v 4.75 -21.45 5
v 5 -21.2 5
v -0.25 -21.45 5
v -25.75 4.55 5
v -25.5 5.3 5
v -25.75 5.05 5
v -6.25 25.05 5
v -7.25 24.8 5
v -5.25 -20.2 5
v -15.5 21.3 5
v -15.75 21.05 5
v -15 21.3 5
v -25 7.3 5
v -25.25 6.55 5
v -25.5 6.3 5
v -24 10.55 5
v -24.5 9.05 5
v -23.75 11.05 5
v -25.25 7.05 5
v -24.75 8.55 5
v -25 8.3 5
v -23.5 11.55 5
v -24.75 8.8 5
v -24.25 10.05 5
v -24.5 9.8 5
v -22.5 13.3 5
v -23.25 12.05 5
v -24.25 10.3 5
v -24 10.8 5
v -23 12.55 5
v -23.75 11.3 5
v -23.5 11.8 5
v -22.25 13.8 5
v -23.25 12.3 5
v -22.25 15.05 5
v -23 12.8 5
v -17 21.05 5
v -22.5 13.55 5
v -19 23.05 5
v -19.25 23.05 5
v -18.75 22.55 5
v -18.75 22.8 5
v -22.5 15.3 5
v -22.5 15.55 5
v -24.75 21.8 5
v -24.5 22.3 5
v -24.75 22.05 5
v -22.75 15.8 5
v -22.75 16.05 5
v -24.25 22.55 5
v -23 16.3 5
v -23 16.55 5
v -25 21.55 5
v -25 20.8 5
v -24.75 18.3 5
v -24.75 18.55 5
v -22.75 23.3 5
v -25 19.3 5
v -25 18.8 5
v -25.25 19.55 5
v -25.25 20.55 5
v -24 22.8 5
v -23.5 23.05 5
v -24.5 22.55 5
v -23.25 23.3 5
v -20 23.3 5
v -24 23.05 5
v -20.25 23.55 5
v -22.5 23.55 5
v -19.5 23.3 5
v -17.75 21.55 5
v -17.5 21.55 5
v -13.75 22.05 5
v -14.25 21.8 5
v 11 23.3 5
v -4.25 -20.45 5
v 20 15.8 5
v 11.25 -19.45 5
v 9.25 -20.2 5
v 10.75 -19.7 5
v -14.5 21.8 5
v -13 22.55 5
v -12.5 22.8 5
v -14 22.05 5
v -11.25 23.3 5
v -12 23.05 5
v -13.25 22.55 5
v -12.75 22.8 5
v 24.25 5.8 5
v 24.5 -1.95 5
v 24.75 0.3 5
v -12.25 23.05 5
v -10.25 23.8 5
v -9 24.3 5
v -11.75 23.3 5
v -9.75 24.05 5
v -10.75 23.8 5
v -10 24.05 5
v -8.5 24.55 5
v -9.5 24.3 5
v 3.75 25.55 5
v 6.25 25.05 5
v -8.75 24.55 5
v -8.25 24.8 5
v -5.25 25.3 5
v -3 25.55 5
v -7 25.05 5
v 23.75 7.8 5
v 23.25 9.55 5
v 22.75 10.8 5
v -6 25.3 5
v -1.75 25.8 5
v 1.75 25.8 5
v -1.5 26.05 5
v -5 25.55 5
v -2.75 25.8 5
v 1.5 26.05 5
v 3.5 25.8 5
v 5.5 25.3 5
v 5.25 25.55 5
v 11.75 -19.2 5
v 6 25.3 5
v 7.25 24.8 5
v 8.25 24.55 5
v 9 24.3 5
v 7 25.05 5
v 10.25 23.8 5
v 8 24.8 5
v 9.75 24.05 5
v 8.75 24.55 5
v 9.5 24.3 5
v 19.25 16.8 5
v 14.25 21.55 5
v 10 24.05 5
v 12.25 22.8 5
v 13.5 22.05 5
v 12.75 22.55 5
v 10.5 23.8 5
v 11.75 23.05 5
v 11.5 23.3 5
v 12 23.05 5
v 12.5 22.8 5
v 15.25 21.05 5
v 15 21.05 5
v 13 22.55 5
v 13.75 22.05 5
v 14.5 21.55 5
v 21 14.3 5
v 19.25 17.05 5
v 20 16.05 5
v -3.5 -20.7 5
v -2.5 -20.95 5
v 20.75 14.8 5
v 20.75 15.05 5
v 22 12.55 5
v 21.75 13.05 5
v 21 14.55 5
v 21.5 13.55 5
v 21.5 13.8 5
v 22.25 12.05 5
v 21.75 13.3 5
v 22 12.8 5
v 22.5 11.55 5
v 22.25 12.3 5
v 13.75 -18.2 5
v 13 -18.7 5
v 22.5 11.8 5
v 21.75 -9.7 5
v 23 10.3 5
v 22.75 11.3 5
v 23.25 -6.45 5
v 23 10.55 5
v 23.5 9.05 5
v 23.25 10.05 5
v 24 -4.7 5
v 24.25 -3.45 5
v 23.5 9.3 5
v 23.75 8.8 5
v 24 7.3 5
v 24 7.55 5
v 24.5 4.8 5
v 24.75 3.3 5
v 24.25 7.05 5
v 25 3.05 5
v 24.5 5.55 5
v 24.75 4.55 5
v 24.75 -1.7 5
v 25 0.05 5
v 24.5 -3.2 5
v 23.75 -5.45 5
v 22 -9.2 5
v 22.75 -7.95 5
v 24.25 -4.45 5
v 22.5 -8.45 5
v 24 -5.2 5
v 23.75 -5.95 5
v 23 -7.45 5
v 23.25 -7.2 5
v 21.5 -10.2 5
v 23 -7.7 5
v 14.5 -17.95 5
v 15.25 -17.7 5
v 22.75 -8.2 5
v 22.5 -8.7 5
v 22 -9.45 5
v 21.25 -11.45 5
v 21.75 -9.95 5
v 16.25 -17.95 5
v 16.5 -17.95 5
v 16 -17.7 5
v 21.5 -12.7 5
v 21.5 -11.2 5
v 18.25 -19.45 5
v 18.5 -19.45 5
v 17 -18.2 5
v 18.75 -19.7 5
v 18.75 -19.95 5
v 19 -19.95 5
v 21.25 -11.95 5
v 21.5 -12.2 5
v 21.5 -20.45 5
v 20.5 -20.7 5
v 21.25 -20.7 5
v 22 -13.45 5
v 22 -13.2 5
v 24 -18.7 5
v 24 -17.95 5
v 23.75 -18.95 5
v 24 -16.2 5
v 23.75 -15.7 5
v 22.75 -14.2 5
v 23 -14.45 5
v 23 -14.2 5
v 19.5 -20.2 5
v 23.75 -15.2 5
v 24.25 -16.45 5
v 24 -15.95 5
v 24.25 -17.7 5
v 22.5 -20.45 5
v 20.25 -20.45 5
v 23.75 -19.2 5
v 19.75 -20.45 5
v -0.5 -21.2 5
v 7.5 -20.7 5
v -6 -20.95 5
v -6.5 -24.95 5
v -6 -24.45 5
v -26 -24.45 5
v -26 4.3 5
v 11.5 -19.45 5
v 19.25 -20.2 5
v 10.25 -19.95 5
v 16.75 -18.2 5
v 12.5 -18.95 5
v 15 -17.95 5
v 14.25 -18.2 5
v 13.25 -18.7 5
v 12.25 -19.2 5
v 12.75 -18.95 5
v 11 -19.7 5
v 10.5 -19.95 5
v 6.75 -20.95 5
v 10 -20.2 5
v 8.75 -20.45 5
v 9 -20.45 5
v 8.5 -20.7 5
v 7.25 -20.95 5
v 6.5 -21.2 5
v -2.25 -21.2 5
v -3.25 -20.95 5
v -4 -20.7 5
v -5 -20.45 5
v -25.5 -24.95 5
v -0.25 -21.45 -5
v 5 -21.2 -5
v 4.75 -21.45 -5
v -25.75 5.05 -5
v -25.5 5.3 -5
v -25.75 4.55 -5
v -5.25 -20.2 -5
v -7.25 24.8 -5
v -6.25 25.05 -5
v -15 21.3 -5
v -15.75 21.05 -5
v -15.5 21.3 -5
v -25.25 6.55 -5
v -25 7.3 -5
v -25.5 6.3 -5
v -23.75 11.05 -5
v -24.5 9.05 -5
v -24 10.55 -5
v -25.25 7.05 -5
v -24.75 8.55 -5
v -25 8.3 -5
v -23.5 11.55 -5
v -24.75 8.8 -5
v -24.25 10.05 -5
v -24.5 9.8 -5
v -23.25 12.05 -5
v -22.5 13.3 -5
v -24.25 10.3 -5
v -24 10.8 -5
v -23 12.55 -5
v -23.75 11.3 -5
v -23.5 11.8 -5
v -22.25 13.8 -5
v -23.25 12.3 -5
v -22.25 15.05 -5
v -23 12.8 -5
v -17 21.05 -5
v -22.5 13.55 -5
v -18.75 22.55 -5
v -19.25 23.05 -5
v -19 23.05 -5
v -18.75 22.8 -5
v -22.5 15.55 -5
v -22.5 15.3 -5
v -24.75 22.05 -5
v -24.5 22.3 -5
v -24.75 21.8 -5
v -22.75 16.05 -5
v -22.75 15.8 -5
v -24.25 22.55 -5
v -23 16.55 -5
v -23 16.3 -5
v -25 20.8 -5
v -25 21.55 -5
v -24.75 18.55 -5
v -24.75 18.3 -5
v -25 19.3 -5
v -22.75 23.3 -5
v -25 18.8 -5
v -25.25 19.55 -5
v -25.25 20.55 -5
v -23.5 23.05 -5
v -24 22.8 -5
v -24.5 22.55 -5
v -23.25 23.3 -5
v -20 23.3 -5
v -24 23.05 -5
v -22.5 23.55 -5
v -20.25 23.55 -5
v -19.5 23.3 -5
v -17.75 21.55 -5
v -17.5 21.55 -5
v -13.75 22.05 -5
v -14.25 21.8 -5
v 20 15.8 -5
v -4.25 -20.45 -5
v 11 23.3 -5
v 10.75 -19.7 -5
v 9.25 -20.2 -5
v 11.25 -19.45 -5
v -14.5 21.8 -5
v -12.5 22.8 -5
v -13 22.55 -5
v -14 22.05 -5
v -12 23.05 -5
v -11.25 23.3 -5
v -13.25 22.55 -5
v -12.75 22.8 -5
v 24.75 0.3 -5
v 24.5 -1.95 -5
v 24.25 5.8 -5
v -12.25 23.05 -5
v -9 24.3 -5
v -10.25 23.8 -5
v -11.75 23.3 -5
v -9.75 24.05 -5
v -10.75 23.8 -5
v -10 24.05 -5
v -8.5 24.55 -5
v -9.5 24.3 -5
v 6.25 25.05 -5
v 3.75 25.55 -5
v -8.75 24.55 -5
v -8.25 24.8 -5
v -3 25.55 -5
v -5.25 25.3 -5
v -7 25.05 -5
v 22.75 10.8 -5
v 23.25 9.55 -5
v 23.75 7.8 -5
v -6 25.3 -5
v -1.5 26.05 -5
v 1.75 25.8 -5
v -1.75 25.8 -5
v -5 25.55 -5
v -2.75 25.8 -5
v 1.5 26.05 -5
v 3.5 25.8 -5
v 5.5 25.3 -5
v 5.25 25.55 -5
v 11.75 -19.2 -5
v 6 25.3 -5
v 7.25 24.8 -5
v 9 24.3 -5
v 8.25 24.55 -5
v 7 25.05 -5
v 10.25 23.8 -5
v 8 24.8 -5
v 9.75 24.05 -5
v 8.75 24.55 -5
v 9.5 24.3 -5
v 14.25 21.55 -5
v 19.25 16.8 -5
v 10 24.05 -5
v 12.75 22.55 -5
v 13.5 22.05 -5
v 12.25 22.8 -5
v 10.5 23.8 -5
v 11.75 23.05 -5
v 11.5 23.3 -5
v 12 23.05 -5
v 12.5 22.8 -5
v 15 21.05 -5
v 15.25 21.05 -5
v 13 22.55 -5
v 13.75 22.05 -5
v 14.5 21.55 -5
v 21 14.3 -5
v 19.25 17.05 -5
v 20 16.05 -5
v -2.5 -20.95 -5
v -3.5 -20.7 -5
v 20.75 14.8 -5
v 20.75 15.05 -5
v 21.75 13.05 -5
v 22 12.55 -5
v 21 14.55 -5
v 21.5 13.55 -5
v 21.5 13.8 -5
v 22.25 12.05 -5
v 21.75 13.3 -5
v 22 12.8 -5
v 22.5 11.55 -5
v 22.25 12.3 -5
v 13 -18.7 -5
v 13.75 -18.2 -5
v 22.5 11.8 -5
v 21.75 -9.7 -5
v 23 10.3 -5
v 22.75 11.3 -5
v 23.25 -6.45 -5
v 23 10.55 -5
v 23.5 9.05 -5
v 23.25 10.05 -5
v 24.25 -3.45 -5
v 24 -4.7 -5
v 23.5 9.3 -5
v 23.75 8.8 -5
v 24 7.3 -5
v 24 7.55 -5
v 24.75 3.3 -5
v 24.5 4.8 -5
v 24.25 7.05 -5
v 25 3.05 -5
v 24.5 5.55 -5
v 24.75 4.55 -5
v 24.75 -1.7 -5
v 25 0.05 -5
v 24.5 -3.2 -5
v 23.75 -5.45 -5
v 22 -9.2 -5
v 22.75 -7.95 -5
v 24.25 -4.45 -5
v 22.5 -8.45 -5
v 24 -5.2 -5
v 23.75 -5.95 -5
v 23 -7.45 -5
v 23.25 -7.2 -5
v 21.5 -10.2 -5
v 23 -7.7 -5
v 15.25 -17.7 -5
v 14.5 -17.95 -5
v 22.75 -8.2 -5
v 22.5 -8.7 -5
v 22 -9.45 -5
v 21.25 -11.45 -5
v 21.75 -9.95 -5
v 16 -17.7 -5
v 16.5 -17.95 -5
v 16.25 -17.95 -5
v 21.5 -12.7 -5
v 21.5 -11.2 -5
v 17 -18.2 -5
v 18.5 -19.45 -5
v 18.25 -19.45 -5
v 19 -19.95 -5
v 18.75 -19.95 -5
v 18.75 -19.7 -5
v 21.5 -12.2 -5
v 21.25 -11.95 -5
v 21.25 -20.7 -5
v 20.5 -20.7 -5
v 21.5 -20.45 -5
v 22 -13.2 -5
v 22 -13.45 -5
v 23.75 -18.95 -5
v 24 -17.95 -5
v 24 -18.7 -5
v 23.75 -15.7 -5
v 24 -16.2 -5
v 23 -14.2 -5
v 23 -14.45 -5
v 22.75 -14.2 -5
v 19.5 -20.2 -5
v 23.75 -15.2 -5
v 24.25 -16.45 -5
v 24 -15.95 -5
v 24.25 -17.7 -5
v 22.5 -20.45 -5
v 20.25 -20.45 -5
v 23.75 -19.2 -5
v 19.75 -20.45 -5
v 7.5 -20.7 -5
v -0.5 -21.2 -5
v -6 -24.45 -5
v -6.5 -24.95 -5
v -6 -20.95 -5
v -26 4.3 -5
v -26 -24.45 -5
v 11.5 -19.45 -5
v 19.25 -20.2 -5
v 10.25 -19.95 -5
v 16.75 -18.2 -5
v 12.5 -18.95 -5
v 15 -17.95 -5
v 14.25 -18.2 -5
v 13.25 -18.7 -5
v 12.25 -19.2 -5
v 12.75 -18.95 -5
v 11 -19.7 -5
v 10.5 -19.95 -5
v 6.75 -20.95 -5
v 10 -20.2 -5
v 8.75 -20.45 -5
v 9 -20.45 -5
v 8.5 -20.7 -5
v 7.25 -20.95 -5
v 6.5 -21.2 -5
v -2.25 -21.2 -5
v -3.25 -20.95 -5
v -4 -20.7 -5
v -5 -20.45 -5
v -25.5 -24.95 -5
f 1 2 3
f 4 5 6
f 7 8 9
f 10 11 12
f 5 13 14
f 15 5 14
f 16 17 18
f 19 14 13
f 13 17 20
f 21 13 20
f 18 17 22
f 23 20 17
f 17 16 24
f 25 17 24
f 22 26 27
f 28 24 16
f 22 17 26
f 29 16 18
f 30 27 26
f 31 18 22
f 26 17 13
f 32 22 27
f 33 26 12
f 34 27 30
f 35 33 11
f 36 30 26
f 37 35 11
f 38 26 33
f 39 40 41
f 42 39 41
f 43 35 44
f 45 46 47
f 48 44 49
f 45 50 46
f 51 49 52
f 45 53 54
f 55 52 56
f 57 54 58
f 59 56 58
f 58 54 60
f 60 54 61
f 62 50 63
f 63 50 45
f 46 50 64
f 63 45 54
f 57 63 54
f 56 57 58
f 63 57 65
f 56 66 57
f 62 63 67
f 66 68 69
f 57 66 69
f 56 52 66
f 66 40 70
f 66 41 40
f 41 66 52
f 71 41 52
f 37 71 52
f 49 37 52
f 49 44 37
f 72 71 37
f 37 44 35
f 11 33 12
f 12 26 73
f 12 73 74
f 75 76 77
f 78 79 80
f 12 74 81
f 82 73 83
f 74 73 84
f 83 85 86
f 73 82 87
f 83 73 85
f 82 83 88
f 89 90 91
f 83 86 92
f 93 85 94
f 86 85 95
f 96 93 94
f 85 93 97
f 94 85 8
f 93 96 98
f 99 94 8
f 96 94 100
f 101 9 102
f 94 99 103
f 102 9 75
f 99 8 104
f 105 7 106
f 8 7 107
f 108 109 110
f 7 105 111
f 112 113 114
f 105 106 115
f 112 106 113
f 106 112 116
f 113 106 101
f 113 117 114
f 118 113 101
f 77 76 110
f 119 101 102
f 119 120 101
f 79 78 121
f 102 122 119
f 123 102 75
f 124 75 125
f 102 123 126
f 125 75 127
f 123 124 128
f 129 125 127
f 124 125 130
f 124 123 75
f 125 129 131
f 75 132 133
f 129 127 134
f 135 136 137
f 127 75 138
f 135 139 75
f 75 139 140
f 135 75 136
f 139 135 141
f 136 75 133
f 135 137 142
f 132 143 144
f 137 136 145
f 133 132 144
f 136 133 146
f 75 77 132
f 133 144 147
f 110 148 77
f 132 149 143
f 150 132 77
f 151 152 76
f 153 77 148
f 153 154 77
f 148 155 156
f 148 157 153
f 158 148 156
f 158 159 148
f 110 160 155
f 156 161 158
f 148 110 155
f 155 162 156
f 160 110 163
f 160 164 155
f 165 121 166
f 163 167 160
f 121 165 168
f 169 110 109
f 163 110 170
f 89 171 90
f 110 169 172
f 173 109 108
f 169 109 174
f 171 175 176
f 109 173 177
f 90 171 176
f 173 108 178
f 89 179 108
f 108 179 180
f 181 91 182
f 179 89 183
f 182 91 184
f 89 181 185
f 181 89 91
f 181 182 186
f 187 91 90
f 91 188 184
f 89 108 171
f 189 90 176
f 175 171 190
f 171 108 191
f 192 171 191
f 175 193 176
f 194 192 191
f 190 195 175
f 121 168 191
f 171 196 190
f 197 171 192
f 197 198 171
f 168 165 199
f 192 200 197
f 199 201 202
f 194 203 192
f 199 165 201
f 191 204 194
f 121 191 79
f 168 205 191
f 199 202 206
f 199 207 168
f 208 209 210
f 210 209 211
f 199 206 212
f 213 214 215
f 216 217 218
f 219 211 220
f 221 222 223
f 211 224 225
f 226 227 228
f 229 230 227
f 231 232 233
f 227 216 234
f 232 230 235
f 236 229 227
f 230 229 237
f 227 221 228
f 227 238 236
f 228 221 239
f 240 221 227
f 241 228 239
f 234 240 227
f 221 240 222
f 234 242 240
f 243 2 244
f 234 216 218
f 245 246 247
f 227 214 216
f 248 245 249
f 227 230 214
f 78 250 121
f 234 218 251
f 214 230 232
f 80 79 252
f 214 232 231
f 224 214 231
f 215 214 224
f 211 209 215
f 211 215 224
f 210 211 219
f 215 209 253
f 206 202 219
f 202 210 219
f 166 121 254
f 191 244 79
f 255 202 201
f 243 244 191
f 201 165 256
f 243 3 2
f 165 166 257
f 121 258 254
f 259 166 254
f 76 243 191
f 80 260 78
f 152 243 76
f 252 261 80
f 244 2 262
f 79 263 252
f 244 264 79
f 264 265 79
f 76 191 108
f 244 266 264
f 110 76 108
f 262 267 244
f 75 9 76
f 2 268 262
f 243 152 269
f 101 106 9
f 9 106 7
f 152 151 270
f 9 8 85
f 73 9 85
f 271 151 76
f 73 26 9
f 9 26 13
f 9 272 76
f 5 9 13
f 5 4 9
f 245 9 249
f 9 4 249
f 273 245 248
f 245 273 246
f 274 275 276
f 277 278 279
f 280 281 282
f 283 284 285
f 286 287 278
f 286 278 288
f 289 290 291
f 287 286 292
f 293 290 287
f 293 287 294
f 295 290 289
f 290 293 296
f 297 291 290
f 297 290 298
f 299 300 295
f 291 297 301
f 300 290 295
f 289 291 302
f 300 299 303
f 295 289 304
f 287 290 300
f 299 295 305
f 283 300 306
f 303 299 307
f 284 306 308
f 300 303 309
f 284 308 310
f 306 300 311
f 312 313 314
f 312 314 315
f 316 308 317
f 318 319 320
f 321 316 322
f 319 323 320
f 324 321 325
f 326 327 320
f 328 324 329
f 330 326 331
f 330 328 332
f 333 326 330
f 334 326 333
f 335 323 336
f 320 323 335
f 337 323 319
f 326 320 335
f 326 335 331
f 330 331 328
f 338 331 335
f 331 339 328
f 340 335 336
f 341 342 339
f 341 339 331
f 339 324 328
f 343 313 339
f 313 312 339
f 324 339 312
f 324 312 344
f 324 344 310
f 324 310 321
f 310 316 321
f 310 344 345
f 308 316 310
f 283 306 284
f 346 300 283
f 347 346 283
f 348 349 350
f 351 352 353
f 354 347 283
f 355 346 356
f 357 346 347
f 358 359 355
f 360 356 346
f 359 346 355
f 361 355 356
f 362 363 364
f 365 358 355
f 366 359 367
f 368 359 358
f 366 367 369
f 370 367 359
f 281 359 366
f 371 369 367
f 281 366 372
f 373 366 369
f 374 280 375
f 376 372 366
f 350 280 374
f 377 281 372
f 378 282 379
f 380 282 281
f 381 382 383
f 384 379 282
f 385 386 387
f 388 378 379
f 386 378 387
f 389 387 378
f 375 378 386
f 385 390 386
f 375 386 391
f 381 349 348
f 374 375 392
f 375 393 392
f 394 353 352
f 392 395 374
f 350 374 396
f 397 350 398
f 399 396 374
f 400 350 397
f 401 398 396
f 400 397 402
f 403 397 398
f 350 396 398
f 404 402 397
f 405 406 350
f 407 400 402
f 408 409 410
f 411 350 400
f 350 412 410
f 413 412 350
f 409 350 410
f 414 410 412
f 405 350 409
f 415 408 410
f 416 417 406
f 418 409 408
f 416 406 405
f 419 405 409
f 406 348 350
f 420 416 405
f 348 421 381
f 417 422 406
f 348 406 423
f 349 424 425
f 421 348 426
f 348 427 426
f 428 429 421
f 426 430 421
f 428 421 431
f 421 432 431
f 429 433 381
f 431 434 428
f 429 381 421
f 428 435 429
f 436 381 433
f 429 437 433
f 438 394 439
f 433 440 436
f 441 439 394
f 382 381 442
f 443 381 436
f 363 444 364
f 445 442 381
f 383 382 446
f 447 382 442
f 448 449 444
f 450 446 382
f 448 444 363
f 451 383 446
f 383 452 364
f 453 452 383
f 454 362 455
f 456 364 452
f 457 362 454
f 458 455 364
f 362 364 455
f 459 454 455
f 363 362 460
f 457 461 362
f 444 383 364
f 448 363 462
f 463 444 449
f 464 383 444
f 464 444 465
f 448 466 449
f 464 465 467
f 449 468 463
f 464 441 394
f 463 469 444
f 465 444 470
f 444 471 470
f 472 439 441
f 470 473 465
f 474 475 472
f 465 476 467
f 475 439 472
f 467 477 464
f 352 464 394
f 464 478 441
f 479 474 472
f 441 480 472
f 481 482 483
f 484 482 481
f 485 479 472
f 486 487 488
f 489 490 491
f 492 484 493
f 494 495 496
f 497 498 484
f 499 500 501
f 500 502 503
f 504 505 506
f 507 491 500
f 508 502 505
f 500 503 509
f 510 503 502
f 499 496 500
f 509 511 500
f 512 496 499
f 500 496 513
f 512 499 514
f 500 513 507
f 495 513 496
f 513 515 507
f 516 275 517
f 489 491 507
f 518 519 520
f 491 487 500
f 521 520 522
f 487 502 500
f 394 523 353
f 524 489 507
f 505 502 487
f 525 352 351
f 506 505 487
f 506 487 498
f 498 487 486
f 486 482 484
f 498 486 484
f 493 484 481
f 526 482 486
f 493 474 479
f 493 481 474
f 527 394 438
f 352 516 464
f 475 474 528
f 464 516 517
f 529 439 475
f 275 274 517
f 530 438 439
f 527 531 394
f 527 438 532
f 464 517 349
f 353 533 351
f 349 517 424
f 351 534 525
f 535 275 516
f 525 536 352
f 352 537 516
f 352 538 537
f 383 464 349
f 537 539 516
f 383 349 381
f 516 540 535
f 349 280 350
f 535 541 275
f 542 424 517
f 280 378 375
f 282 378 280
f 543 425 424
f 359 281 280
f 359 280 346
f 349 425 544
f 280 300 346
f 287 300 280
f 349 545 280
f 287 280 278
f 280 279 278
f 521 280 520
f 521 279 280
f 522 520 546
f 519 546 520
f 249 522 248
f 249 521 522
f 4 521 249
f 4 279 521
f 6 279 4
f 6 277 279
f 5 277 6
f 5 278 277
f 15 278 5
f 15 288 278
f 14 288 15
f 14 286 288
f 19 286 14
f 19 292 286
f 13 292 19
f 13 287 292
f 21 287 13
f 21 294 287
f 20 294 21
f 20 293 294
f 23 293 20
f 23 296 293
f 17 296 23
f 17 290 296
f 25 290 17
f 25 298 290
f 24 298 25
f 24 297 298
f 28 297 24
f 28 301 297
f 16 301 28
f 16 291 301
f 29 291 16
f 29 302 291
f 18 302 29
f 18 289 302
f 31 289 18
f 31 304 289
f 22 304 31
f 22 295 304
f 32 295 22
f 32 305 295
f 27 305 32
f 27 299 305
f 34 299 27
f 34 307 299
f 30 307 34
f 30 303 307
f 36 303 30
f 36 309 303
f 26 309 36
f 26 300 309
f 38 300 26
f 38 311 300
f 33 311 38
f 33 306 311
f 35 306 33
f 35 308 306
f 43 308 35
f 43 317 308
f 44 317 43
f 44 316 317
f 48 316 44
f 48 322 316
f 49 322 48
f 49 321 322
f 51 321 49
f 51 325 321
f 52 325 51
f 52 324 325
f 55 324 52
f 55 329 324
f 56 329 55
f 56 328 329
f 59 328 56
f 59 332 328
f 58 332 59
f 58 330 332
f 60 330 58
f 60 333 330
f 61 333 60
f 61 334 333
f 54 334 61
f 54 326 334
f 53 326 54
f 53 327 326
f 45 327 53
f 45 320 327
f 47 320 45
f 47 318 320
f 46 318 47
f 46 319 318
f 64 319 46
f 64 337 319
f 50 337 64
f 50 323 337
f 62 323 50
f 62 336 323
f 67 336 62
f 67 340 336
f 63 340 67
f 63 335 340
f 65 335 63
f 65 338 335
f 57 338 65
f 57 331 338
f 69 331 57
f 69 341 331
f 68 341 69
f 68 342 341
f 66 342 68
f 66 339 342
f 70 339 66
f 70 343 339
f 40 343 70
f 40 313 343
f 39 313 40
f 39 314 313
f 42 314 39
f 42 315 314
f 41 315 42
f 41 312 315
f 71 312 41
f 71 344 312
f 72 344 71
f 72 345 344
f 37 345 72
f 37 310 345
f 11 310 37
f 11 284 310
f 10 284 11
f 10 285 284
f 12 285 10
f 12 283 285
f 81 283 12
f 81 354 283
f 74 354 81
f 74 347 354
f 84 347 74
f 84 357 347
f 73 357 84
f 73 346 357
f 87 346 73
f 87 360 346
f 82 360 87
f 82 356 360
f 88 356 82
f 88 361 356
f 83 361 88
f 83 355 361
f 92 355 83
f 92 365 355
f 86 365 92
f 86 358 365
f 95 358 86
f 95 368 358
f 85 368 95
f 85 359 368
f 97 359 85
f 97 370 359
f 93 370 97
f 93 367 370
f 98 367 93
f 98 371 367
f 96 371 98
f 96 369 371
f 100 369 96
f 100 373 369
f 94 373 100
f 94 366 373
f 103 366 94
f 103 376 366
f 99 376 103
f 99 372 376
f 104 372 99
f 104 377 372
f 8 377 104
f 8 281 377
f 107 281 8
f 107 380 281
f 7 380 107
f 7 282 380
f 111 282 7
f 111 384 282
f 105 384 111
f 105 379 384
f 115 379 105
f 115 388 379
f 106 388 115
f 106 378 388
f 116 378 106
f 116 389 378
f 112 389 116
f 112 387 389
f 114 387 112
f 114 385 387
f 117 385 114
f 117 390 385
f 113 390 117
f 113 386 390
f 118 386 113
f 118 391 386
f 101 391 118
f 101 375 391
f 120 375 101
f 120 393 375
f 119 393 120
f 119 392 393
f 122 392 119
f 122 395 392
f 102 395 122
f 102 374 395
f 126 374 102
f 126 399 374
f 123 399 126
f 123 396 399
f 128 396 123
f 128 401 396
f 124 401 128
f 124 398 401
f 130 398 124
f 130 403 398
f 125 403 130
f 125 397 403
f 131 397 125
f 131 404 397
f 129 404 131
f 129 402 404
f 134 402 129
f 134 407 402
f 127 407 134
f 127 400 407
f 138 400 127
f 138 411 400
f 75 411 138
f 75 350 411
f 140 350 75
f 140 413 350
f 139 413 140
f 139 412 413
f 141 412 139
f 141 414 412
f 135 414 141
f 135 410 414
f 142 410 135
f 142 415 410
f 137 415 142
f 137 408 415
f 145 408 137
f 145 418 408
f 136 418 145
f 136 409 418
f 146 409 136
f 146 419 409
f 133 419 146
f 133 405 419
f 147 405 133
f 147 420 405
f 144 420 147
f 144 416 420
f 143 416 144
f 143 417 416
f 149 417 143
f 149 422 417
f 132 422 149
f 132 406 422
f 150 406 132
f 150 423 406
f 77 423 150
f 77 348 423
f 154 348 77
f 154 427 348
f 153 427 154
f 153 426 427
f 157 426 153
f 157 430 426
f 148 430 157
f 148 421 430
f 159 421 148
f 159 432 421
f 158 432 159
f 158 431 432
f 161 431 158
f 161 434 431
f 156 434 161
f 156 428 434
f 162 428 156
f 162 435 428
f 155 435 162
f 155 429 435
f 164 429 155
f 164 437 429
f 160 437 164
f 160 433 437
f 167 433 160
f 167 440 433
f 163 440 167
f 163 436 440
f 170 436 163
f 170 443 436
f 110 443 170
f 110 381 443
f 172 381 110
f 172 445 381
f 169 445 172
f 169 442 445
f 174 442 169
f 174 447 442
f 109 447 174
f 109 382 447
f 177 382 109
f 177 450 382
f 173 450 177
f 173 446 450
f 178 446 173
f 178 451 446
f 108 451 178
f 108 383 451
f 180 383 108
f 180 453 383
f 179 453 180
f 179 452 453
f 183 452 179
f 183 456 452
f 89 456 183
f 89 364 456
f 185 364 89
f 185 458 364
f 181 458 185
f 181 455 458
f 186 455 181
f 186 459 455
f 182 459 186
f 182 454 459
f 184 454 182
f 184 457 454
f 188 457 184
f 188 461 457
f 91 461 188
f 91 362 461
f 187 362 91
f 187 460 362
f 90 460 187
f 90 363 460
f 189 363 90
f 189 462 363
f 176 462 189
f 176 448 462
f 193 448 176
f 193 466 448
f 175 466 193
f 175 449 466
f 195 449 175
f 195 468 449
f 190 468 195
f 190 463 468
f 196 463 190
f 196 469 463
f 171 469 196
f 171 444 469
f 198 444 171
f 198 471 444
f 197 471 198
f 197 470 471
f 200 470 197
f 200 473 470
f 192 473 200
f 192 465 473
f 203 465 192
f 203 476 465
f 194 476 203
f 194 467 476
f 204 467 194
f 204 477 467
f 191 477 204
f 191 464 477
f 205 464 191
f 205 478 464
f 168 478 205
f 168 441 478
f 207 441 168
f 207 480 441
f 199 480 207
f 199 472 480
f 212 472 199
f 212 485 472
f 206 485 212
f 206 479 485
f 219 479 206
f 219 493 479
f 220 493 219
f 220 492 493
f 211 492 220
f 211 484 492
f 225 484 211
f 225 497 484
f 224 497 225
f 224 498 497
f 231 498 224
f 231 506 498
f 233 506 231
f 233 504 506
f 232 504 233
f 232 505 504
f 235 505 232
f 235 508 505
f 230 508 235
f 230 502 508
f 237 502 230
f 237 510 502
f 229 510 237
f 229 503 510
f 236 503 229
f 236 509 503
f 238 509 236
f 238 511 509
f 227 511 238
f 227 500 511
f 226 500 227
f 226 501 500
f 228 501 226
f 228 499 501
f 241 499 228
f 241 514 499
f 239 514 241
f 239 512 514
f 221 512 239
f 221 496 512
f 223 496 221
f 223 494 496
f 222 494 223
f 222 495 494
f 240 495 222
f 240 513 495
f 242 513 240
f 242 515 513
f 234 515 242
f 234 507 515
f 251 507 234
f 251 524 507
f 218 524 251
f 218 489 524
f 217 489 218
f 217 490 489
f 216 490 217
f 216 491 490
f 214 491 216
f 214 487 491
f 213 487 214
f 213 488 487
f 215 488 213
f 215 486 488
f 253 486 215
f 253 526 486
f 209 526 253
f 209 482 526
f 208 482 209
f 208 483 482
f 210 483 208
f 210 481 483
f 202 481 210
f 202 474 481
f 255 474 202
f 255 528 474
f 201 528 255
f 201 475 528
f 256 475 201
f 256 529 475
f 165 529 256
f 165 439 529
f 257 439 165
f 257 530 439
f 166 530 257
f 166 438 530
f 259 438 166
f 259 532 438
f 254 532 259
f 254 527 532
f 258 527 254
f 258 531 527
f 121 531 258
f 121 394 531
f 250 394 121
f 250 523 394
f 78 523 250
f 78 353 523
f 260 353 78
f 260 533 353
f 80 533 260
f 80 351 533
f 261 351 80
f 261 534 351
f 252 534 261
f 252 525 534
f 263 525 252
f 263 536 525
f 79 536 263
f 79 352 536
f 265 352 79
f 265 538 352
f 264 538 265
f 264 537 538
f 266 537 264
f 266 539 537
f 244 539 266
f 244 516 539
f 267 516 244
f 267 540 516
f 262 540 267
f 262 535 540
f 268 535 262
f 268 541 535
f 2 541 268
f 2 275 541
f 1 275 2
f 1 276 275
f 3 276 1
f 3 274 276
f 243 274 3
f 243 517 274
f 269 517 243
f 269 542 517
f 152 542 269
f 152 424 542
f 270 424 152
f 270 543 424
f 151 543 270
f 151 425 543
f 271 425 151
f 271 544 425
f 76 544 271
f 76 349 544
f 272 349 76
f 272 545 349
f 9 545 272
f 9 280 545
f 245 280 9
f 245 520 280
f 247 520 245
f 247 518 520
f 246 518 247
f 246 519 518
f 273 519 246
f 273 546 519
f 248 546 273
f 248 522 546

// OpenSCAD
module blower(){
    translate([25,-25,5])translate([7.5, -8.2,0])rotate([0,180,0])linear_extrude(10)scale(.25)polygon(points = [[30,133],[30,134],[30,135],[30,136],[30,137],[30,138],[30,139],[30,140],[30,141],[30,142],[30,143],[30,144],[30,145],[31,146],[31,147],[31,148],[31,149],[31,150],[31,151],[32,152],[32,153],[32,154],[32,155],[33,156],[33,157],[33,158],[33,159],[33,160],[33,161],[34,162],[34,163],[35,164],[35,165],[35,166],[35,167],[35,168],[36,169],[36,170],[37,171],[37,172],[37,173],[38,174],[38,175],[39,176],[39,177],[39,178],[40,179],[40,180],[41,181],[41,182],[42,183],[42,184],[43,185],[43,186],[44,187],[44,188],[45,189],[46,190],[46,191],[47,192],[47,193],[48,194],[49,195],[50,196],[50,197],[51,198],[52,199],[53,200],[53,201],[54,202],[55,203],[56,204],[57,205],[58,206],[59,207],[60,208],[61,209],[62,210],[63,211],[64,212],[65,213],[66,214],[67,215],[68,216],[69,217],[70,217],[71,218],[72,219],[73,219],[74,220],[75,221],[76,221],[77,222],[78,223],[79,223],[80,224],[81,224],[82,225],[83,225],[84,226],[85,226],[86,226],[87,227],[88,228],[89,228],[90,229],[91,229],[92,230],[93,230],[94,230],[95,231],[96,231],[97,231],[98,232],[99,232],[100,232],[101,232],[102,233],[103,233],[104,233],[105,233],[106,234],[107,234],[108,234],[109,235],[110,235],[111,235],[112,235],[113,235],[114,235],[115,235],[116,236],[117,236],[118,236],[119,236],[120,236],[121,236],[122,236],[123,236],[124,237],[125,237],[126,237],[127,237],[128,237],[129,237],[130,237],[131,237],[132,237],[133,237],[134,237],[135,237],[136,237],[137,236],[138,236],[139,236],[140,236],[141,236],[142,235],[143,235],[144,235],[145,235],[146,235],[147,235],[148,235],[149,235],[150,235],[151,234],[152,234],[153,234],[154,234],[155,233],[156,233],[157,233],[158,233],[159,232],[160,232],[161,232],[162,232],[163,232],[164,231],[165,231],[166,230],[167,230],[168,230],[169,229],[170,229],[171,228],[172,228],[173,228],[174,227],[175,226],[176,226],[177,226],[178,225],[179,225],[180,224],[181,224],[182,223],[183,223],[184,222],[185,221],[186,221],[187,220],[188,220],[189,219],[190,218],[191,218],[192,218],[193,217],[194,217],[195,217],[196,217],[197,217],[198,217],[199,218],[200,219],[201,219],[202,220],[203,221],[204,222],[205,223],[205,224],[206,225],[207,225],[208,226],[209,226],[210,226],[211,227],[212,227],[213,227],[214,227],[215,227],[216,227],[217,227],[218,227],[219,227],[220,227],[221,226],[222,226],[223,226],[224,225],[225,225],[226,225],[226,224],[227,223],[228,223],[228,222],[229,221],[229,220],[230,219],[230,218],[230,217],[230,216],[231,215],[231,214],[231,213],[231,212],[231,211],[230,210],[230,209],[230,208],[229,207],[229,206],[228,205],[227,204],[226,203],[225,202],[224,201],[223,200],[222,199],[222,198],[221,197],[221,196],[220,195],[220,194],[219,193],[219,192],[219,191],[219,190],[219,189],[219,188],[220,187],[220,186],[221,185],[222,184],[222,183],[223,182],[223,181],[224,180],[224,179],[225,178],[225,177],[226,176],[226,175],[227,174],[227,173],[228,172],[228,171],[228,170],[228,169],[229,168],[229,167],[230,166],[230,165],[230,164],[230,163],[230,162],[231,161],[231,160],[231,159],[232,158],[232,157],[232,156],[232,155],[232,154],[233,153],[233,152],[233,151],[234,150],[234,149],[234,148],[234,147],[234,146],[234,145],[234,144],[234,143],[234,142],[234,141],[234,140],[234,139],[234,138],[234,137],[234,136],[234,135],[234,134],[234,133],[234,132],[234,131],[234,130],[234,129],[234,128],[234,127],[234,126],[234,125],[234,124],[234,123],[234,122],[234,121],[234,120],[234,119],[234,118],[234,117],[234,116],[234,115],[234,114],[234,113],[234,112],[234,111],[234,110],[234,109],[234,108],[234,107],[234,106],[234,105],[234,104],[234,103],[234,102],[234,101],[234,100],[234,99],[234,98],[234,97],[234,96],[234,95],[234,94],[234,93],[234,92],[234,91],[234,90],[234,89],[234,88],[234,87],[234,86],[234,85],[234,84],[234,83],[234,82],[234,81],[234,80],[234,79],[234,78],[234,77],[234,76],[234,75],[234,74],[234,73],[234,72],[234,71],[234,70],[234,69],[234,68],[234,67],[234,66],[234,65],[234,64],[234,63],[234,62],[234,61],[234,60],[234,59],[234,58],[234,57],[234,56],[234,55],[234,54],[234,53],[234,52],[234,51],[234,50],[234,49],[234,48],[234,47],[234,46],[234,45],[234,44],[234,43],[234,42],[234,41],[234,40],[234,39],[234,38],[234,37],[234,36],[234,35],[233,34],[232,33],[231,33],[230,33],[229,33],[228,33],[227,33],[226,33],[225,33],[224,33],[223,33],[222,33],[221,33],[220,33],[219,33],[218,33],[217,33],[216,33],[215,33],[214,33],[213,33],[212,33],[211,33],[210,33],[209,33],[208,33],[207,33],[206,33],[205,33],[204,33],[203,33],[202,33],[201,33],[200,33],[199,33],[198,33],[197,33],[196,33],[195,33],[194,33],[193,33],[192,33],[191,33],[190,33],[189,33],[188,33],[187,33],[186,33],[185,33],[184,33],[183,33],[182,33],[181,33],[180,33],[179,33],[178,33],[177,33],[176,33],[175,33],[174,33],[173,33],[172,33],[171,33],[170,33],[169,33],[168,33],[167,33],[166,33],[165,33],[164,33],[163,33],[162,33],[161,33],[160,33],[159,33],[158,33],[157,33],[156,33],[155,34],[154,35],[154,36],[154,37],[154,38],[154,39],[154,40],[154,41],[154,42],[154,43],[154,44],[154,45],[154,46],[154,47],[154,48],[154,49],[153,50],[152,51],[151,52],[150,51],[149,51],[148,51],[147,51],[146,50],[145,50],[144,50],[143,49],[142,49],[141,49],[140,49],[139,48],[138,48],[137,48],[136,48],[135,48],[134,48],[133,48],[132,48],[131,47],[130,47],[129,47],[128,47],[127,47],[126,47],[125,47],[124,47],[123,47],[122,47],[121,47],[120,47],[119,47],[118,47],[117,47],[116,47],[115,47],[114,47],[113,47],[112,47],[111,47],[110,48],[109,48],[108,48],[107,48],[106,48],[105,48],[104,48],[103,49],[102,49],[101,49],[100,50],[99,50],[98,50],[97,50],[96,50],[95,51],[94,51],[93,52],[92,52],[91,52],[90,52],[89,53],[88,53],[87,54],[86,54],[85,55],[84,55],[83,56],[82,56],[81,56],[80,57],[79,57],[78,58],[77,58],[76,59],[75,60],[74,60],[73,60],[72,61],[71,61],[70,61],[69,62],[68,62],[67,62],[66,62],[65,61],[64,61],[63,60],[62,60],[61,59],[60,58],[59,57],[58,56],[57,55],[56,55],[55,54],[55,53],[54,53],[53,52],[52,52],[51,51],[50,51],[49,51],[48,50],[47,50],[46,50],[45,50],[44,51],[43,51],[42,51],[41,51],[40,51],[39,52],[38,53],[37,54],[36,55],[35,56],[35,57],[34,58],[34,59],[34,60],[34,61],[33,62],[33,63],[33,64],[33,65],[33,66],[33,67],[34,68],[34,69],[35,70],[35,71],[35,72],[36,73],[37,74],[38,75],[38,76],[39,76],[40,77],[41,78],[42,79],[42,80],[43,81],[44,82],[44,83],[44,84],[45,85],[45,86],[45,87],[44,88],[44,89],[44,90],[44,91],[44,92],[43,93],[43,94],[42,95],[42,96],[41,97],[40,98],[40,99],[39,100],[39,101],[38,102],[38,103],[37,104],[37,105],[37,106],[37,107],[36,108],[35,109],[35,110],[35,111],[34,112],[34,113],[34,114],[33,115],[33,116],[33,117],[33,118],[33,119],[32,120],[32,121],[32,122],[32,123],[32,124],[32,125],[31,126],[31,127],[31,128],[31,129],[31,130],[31,131],[31,132],[31,134],]);
}
blower();
